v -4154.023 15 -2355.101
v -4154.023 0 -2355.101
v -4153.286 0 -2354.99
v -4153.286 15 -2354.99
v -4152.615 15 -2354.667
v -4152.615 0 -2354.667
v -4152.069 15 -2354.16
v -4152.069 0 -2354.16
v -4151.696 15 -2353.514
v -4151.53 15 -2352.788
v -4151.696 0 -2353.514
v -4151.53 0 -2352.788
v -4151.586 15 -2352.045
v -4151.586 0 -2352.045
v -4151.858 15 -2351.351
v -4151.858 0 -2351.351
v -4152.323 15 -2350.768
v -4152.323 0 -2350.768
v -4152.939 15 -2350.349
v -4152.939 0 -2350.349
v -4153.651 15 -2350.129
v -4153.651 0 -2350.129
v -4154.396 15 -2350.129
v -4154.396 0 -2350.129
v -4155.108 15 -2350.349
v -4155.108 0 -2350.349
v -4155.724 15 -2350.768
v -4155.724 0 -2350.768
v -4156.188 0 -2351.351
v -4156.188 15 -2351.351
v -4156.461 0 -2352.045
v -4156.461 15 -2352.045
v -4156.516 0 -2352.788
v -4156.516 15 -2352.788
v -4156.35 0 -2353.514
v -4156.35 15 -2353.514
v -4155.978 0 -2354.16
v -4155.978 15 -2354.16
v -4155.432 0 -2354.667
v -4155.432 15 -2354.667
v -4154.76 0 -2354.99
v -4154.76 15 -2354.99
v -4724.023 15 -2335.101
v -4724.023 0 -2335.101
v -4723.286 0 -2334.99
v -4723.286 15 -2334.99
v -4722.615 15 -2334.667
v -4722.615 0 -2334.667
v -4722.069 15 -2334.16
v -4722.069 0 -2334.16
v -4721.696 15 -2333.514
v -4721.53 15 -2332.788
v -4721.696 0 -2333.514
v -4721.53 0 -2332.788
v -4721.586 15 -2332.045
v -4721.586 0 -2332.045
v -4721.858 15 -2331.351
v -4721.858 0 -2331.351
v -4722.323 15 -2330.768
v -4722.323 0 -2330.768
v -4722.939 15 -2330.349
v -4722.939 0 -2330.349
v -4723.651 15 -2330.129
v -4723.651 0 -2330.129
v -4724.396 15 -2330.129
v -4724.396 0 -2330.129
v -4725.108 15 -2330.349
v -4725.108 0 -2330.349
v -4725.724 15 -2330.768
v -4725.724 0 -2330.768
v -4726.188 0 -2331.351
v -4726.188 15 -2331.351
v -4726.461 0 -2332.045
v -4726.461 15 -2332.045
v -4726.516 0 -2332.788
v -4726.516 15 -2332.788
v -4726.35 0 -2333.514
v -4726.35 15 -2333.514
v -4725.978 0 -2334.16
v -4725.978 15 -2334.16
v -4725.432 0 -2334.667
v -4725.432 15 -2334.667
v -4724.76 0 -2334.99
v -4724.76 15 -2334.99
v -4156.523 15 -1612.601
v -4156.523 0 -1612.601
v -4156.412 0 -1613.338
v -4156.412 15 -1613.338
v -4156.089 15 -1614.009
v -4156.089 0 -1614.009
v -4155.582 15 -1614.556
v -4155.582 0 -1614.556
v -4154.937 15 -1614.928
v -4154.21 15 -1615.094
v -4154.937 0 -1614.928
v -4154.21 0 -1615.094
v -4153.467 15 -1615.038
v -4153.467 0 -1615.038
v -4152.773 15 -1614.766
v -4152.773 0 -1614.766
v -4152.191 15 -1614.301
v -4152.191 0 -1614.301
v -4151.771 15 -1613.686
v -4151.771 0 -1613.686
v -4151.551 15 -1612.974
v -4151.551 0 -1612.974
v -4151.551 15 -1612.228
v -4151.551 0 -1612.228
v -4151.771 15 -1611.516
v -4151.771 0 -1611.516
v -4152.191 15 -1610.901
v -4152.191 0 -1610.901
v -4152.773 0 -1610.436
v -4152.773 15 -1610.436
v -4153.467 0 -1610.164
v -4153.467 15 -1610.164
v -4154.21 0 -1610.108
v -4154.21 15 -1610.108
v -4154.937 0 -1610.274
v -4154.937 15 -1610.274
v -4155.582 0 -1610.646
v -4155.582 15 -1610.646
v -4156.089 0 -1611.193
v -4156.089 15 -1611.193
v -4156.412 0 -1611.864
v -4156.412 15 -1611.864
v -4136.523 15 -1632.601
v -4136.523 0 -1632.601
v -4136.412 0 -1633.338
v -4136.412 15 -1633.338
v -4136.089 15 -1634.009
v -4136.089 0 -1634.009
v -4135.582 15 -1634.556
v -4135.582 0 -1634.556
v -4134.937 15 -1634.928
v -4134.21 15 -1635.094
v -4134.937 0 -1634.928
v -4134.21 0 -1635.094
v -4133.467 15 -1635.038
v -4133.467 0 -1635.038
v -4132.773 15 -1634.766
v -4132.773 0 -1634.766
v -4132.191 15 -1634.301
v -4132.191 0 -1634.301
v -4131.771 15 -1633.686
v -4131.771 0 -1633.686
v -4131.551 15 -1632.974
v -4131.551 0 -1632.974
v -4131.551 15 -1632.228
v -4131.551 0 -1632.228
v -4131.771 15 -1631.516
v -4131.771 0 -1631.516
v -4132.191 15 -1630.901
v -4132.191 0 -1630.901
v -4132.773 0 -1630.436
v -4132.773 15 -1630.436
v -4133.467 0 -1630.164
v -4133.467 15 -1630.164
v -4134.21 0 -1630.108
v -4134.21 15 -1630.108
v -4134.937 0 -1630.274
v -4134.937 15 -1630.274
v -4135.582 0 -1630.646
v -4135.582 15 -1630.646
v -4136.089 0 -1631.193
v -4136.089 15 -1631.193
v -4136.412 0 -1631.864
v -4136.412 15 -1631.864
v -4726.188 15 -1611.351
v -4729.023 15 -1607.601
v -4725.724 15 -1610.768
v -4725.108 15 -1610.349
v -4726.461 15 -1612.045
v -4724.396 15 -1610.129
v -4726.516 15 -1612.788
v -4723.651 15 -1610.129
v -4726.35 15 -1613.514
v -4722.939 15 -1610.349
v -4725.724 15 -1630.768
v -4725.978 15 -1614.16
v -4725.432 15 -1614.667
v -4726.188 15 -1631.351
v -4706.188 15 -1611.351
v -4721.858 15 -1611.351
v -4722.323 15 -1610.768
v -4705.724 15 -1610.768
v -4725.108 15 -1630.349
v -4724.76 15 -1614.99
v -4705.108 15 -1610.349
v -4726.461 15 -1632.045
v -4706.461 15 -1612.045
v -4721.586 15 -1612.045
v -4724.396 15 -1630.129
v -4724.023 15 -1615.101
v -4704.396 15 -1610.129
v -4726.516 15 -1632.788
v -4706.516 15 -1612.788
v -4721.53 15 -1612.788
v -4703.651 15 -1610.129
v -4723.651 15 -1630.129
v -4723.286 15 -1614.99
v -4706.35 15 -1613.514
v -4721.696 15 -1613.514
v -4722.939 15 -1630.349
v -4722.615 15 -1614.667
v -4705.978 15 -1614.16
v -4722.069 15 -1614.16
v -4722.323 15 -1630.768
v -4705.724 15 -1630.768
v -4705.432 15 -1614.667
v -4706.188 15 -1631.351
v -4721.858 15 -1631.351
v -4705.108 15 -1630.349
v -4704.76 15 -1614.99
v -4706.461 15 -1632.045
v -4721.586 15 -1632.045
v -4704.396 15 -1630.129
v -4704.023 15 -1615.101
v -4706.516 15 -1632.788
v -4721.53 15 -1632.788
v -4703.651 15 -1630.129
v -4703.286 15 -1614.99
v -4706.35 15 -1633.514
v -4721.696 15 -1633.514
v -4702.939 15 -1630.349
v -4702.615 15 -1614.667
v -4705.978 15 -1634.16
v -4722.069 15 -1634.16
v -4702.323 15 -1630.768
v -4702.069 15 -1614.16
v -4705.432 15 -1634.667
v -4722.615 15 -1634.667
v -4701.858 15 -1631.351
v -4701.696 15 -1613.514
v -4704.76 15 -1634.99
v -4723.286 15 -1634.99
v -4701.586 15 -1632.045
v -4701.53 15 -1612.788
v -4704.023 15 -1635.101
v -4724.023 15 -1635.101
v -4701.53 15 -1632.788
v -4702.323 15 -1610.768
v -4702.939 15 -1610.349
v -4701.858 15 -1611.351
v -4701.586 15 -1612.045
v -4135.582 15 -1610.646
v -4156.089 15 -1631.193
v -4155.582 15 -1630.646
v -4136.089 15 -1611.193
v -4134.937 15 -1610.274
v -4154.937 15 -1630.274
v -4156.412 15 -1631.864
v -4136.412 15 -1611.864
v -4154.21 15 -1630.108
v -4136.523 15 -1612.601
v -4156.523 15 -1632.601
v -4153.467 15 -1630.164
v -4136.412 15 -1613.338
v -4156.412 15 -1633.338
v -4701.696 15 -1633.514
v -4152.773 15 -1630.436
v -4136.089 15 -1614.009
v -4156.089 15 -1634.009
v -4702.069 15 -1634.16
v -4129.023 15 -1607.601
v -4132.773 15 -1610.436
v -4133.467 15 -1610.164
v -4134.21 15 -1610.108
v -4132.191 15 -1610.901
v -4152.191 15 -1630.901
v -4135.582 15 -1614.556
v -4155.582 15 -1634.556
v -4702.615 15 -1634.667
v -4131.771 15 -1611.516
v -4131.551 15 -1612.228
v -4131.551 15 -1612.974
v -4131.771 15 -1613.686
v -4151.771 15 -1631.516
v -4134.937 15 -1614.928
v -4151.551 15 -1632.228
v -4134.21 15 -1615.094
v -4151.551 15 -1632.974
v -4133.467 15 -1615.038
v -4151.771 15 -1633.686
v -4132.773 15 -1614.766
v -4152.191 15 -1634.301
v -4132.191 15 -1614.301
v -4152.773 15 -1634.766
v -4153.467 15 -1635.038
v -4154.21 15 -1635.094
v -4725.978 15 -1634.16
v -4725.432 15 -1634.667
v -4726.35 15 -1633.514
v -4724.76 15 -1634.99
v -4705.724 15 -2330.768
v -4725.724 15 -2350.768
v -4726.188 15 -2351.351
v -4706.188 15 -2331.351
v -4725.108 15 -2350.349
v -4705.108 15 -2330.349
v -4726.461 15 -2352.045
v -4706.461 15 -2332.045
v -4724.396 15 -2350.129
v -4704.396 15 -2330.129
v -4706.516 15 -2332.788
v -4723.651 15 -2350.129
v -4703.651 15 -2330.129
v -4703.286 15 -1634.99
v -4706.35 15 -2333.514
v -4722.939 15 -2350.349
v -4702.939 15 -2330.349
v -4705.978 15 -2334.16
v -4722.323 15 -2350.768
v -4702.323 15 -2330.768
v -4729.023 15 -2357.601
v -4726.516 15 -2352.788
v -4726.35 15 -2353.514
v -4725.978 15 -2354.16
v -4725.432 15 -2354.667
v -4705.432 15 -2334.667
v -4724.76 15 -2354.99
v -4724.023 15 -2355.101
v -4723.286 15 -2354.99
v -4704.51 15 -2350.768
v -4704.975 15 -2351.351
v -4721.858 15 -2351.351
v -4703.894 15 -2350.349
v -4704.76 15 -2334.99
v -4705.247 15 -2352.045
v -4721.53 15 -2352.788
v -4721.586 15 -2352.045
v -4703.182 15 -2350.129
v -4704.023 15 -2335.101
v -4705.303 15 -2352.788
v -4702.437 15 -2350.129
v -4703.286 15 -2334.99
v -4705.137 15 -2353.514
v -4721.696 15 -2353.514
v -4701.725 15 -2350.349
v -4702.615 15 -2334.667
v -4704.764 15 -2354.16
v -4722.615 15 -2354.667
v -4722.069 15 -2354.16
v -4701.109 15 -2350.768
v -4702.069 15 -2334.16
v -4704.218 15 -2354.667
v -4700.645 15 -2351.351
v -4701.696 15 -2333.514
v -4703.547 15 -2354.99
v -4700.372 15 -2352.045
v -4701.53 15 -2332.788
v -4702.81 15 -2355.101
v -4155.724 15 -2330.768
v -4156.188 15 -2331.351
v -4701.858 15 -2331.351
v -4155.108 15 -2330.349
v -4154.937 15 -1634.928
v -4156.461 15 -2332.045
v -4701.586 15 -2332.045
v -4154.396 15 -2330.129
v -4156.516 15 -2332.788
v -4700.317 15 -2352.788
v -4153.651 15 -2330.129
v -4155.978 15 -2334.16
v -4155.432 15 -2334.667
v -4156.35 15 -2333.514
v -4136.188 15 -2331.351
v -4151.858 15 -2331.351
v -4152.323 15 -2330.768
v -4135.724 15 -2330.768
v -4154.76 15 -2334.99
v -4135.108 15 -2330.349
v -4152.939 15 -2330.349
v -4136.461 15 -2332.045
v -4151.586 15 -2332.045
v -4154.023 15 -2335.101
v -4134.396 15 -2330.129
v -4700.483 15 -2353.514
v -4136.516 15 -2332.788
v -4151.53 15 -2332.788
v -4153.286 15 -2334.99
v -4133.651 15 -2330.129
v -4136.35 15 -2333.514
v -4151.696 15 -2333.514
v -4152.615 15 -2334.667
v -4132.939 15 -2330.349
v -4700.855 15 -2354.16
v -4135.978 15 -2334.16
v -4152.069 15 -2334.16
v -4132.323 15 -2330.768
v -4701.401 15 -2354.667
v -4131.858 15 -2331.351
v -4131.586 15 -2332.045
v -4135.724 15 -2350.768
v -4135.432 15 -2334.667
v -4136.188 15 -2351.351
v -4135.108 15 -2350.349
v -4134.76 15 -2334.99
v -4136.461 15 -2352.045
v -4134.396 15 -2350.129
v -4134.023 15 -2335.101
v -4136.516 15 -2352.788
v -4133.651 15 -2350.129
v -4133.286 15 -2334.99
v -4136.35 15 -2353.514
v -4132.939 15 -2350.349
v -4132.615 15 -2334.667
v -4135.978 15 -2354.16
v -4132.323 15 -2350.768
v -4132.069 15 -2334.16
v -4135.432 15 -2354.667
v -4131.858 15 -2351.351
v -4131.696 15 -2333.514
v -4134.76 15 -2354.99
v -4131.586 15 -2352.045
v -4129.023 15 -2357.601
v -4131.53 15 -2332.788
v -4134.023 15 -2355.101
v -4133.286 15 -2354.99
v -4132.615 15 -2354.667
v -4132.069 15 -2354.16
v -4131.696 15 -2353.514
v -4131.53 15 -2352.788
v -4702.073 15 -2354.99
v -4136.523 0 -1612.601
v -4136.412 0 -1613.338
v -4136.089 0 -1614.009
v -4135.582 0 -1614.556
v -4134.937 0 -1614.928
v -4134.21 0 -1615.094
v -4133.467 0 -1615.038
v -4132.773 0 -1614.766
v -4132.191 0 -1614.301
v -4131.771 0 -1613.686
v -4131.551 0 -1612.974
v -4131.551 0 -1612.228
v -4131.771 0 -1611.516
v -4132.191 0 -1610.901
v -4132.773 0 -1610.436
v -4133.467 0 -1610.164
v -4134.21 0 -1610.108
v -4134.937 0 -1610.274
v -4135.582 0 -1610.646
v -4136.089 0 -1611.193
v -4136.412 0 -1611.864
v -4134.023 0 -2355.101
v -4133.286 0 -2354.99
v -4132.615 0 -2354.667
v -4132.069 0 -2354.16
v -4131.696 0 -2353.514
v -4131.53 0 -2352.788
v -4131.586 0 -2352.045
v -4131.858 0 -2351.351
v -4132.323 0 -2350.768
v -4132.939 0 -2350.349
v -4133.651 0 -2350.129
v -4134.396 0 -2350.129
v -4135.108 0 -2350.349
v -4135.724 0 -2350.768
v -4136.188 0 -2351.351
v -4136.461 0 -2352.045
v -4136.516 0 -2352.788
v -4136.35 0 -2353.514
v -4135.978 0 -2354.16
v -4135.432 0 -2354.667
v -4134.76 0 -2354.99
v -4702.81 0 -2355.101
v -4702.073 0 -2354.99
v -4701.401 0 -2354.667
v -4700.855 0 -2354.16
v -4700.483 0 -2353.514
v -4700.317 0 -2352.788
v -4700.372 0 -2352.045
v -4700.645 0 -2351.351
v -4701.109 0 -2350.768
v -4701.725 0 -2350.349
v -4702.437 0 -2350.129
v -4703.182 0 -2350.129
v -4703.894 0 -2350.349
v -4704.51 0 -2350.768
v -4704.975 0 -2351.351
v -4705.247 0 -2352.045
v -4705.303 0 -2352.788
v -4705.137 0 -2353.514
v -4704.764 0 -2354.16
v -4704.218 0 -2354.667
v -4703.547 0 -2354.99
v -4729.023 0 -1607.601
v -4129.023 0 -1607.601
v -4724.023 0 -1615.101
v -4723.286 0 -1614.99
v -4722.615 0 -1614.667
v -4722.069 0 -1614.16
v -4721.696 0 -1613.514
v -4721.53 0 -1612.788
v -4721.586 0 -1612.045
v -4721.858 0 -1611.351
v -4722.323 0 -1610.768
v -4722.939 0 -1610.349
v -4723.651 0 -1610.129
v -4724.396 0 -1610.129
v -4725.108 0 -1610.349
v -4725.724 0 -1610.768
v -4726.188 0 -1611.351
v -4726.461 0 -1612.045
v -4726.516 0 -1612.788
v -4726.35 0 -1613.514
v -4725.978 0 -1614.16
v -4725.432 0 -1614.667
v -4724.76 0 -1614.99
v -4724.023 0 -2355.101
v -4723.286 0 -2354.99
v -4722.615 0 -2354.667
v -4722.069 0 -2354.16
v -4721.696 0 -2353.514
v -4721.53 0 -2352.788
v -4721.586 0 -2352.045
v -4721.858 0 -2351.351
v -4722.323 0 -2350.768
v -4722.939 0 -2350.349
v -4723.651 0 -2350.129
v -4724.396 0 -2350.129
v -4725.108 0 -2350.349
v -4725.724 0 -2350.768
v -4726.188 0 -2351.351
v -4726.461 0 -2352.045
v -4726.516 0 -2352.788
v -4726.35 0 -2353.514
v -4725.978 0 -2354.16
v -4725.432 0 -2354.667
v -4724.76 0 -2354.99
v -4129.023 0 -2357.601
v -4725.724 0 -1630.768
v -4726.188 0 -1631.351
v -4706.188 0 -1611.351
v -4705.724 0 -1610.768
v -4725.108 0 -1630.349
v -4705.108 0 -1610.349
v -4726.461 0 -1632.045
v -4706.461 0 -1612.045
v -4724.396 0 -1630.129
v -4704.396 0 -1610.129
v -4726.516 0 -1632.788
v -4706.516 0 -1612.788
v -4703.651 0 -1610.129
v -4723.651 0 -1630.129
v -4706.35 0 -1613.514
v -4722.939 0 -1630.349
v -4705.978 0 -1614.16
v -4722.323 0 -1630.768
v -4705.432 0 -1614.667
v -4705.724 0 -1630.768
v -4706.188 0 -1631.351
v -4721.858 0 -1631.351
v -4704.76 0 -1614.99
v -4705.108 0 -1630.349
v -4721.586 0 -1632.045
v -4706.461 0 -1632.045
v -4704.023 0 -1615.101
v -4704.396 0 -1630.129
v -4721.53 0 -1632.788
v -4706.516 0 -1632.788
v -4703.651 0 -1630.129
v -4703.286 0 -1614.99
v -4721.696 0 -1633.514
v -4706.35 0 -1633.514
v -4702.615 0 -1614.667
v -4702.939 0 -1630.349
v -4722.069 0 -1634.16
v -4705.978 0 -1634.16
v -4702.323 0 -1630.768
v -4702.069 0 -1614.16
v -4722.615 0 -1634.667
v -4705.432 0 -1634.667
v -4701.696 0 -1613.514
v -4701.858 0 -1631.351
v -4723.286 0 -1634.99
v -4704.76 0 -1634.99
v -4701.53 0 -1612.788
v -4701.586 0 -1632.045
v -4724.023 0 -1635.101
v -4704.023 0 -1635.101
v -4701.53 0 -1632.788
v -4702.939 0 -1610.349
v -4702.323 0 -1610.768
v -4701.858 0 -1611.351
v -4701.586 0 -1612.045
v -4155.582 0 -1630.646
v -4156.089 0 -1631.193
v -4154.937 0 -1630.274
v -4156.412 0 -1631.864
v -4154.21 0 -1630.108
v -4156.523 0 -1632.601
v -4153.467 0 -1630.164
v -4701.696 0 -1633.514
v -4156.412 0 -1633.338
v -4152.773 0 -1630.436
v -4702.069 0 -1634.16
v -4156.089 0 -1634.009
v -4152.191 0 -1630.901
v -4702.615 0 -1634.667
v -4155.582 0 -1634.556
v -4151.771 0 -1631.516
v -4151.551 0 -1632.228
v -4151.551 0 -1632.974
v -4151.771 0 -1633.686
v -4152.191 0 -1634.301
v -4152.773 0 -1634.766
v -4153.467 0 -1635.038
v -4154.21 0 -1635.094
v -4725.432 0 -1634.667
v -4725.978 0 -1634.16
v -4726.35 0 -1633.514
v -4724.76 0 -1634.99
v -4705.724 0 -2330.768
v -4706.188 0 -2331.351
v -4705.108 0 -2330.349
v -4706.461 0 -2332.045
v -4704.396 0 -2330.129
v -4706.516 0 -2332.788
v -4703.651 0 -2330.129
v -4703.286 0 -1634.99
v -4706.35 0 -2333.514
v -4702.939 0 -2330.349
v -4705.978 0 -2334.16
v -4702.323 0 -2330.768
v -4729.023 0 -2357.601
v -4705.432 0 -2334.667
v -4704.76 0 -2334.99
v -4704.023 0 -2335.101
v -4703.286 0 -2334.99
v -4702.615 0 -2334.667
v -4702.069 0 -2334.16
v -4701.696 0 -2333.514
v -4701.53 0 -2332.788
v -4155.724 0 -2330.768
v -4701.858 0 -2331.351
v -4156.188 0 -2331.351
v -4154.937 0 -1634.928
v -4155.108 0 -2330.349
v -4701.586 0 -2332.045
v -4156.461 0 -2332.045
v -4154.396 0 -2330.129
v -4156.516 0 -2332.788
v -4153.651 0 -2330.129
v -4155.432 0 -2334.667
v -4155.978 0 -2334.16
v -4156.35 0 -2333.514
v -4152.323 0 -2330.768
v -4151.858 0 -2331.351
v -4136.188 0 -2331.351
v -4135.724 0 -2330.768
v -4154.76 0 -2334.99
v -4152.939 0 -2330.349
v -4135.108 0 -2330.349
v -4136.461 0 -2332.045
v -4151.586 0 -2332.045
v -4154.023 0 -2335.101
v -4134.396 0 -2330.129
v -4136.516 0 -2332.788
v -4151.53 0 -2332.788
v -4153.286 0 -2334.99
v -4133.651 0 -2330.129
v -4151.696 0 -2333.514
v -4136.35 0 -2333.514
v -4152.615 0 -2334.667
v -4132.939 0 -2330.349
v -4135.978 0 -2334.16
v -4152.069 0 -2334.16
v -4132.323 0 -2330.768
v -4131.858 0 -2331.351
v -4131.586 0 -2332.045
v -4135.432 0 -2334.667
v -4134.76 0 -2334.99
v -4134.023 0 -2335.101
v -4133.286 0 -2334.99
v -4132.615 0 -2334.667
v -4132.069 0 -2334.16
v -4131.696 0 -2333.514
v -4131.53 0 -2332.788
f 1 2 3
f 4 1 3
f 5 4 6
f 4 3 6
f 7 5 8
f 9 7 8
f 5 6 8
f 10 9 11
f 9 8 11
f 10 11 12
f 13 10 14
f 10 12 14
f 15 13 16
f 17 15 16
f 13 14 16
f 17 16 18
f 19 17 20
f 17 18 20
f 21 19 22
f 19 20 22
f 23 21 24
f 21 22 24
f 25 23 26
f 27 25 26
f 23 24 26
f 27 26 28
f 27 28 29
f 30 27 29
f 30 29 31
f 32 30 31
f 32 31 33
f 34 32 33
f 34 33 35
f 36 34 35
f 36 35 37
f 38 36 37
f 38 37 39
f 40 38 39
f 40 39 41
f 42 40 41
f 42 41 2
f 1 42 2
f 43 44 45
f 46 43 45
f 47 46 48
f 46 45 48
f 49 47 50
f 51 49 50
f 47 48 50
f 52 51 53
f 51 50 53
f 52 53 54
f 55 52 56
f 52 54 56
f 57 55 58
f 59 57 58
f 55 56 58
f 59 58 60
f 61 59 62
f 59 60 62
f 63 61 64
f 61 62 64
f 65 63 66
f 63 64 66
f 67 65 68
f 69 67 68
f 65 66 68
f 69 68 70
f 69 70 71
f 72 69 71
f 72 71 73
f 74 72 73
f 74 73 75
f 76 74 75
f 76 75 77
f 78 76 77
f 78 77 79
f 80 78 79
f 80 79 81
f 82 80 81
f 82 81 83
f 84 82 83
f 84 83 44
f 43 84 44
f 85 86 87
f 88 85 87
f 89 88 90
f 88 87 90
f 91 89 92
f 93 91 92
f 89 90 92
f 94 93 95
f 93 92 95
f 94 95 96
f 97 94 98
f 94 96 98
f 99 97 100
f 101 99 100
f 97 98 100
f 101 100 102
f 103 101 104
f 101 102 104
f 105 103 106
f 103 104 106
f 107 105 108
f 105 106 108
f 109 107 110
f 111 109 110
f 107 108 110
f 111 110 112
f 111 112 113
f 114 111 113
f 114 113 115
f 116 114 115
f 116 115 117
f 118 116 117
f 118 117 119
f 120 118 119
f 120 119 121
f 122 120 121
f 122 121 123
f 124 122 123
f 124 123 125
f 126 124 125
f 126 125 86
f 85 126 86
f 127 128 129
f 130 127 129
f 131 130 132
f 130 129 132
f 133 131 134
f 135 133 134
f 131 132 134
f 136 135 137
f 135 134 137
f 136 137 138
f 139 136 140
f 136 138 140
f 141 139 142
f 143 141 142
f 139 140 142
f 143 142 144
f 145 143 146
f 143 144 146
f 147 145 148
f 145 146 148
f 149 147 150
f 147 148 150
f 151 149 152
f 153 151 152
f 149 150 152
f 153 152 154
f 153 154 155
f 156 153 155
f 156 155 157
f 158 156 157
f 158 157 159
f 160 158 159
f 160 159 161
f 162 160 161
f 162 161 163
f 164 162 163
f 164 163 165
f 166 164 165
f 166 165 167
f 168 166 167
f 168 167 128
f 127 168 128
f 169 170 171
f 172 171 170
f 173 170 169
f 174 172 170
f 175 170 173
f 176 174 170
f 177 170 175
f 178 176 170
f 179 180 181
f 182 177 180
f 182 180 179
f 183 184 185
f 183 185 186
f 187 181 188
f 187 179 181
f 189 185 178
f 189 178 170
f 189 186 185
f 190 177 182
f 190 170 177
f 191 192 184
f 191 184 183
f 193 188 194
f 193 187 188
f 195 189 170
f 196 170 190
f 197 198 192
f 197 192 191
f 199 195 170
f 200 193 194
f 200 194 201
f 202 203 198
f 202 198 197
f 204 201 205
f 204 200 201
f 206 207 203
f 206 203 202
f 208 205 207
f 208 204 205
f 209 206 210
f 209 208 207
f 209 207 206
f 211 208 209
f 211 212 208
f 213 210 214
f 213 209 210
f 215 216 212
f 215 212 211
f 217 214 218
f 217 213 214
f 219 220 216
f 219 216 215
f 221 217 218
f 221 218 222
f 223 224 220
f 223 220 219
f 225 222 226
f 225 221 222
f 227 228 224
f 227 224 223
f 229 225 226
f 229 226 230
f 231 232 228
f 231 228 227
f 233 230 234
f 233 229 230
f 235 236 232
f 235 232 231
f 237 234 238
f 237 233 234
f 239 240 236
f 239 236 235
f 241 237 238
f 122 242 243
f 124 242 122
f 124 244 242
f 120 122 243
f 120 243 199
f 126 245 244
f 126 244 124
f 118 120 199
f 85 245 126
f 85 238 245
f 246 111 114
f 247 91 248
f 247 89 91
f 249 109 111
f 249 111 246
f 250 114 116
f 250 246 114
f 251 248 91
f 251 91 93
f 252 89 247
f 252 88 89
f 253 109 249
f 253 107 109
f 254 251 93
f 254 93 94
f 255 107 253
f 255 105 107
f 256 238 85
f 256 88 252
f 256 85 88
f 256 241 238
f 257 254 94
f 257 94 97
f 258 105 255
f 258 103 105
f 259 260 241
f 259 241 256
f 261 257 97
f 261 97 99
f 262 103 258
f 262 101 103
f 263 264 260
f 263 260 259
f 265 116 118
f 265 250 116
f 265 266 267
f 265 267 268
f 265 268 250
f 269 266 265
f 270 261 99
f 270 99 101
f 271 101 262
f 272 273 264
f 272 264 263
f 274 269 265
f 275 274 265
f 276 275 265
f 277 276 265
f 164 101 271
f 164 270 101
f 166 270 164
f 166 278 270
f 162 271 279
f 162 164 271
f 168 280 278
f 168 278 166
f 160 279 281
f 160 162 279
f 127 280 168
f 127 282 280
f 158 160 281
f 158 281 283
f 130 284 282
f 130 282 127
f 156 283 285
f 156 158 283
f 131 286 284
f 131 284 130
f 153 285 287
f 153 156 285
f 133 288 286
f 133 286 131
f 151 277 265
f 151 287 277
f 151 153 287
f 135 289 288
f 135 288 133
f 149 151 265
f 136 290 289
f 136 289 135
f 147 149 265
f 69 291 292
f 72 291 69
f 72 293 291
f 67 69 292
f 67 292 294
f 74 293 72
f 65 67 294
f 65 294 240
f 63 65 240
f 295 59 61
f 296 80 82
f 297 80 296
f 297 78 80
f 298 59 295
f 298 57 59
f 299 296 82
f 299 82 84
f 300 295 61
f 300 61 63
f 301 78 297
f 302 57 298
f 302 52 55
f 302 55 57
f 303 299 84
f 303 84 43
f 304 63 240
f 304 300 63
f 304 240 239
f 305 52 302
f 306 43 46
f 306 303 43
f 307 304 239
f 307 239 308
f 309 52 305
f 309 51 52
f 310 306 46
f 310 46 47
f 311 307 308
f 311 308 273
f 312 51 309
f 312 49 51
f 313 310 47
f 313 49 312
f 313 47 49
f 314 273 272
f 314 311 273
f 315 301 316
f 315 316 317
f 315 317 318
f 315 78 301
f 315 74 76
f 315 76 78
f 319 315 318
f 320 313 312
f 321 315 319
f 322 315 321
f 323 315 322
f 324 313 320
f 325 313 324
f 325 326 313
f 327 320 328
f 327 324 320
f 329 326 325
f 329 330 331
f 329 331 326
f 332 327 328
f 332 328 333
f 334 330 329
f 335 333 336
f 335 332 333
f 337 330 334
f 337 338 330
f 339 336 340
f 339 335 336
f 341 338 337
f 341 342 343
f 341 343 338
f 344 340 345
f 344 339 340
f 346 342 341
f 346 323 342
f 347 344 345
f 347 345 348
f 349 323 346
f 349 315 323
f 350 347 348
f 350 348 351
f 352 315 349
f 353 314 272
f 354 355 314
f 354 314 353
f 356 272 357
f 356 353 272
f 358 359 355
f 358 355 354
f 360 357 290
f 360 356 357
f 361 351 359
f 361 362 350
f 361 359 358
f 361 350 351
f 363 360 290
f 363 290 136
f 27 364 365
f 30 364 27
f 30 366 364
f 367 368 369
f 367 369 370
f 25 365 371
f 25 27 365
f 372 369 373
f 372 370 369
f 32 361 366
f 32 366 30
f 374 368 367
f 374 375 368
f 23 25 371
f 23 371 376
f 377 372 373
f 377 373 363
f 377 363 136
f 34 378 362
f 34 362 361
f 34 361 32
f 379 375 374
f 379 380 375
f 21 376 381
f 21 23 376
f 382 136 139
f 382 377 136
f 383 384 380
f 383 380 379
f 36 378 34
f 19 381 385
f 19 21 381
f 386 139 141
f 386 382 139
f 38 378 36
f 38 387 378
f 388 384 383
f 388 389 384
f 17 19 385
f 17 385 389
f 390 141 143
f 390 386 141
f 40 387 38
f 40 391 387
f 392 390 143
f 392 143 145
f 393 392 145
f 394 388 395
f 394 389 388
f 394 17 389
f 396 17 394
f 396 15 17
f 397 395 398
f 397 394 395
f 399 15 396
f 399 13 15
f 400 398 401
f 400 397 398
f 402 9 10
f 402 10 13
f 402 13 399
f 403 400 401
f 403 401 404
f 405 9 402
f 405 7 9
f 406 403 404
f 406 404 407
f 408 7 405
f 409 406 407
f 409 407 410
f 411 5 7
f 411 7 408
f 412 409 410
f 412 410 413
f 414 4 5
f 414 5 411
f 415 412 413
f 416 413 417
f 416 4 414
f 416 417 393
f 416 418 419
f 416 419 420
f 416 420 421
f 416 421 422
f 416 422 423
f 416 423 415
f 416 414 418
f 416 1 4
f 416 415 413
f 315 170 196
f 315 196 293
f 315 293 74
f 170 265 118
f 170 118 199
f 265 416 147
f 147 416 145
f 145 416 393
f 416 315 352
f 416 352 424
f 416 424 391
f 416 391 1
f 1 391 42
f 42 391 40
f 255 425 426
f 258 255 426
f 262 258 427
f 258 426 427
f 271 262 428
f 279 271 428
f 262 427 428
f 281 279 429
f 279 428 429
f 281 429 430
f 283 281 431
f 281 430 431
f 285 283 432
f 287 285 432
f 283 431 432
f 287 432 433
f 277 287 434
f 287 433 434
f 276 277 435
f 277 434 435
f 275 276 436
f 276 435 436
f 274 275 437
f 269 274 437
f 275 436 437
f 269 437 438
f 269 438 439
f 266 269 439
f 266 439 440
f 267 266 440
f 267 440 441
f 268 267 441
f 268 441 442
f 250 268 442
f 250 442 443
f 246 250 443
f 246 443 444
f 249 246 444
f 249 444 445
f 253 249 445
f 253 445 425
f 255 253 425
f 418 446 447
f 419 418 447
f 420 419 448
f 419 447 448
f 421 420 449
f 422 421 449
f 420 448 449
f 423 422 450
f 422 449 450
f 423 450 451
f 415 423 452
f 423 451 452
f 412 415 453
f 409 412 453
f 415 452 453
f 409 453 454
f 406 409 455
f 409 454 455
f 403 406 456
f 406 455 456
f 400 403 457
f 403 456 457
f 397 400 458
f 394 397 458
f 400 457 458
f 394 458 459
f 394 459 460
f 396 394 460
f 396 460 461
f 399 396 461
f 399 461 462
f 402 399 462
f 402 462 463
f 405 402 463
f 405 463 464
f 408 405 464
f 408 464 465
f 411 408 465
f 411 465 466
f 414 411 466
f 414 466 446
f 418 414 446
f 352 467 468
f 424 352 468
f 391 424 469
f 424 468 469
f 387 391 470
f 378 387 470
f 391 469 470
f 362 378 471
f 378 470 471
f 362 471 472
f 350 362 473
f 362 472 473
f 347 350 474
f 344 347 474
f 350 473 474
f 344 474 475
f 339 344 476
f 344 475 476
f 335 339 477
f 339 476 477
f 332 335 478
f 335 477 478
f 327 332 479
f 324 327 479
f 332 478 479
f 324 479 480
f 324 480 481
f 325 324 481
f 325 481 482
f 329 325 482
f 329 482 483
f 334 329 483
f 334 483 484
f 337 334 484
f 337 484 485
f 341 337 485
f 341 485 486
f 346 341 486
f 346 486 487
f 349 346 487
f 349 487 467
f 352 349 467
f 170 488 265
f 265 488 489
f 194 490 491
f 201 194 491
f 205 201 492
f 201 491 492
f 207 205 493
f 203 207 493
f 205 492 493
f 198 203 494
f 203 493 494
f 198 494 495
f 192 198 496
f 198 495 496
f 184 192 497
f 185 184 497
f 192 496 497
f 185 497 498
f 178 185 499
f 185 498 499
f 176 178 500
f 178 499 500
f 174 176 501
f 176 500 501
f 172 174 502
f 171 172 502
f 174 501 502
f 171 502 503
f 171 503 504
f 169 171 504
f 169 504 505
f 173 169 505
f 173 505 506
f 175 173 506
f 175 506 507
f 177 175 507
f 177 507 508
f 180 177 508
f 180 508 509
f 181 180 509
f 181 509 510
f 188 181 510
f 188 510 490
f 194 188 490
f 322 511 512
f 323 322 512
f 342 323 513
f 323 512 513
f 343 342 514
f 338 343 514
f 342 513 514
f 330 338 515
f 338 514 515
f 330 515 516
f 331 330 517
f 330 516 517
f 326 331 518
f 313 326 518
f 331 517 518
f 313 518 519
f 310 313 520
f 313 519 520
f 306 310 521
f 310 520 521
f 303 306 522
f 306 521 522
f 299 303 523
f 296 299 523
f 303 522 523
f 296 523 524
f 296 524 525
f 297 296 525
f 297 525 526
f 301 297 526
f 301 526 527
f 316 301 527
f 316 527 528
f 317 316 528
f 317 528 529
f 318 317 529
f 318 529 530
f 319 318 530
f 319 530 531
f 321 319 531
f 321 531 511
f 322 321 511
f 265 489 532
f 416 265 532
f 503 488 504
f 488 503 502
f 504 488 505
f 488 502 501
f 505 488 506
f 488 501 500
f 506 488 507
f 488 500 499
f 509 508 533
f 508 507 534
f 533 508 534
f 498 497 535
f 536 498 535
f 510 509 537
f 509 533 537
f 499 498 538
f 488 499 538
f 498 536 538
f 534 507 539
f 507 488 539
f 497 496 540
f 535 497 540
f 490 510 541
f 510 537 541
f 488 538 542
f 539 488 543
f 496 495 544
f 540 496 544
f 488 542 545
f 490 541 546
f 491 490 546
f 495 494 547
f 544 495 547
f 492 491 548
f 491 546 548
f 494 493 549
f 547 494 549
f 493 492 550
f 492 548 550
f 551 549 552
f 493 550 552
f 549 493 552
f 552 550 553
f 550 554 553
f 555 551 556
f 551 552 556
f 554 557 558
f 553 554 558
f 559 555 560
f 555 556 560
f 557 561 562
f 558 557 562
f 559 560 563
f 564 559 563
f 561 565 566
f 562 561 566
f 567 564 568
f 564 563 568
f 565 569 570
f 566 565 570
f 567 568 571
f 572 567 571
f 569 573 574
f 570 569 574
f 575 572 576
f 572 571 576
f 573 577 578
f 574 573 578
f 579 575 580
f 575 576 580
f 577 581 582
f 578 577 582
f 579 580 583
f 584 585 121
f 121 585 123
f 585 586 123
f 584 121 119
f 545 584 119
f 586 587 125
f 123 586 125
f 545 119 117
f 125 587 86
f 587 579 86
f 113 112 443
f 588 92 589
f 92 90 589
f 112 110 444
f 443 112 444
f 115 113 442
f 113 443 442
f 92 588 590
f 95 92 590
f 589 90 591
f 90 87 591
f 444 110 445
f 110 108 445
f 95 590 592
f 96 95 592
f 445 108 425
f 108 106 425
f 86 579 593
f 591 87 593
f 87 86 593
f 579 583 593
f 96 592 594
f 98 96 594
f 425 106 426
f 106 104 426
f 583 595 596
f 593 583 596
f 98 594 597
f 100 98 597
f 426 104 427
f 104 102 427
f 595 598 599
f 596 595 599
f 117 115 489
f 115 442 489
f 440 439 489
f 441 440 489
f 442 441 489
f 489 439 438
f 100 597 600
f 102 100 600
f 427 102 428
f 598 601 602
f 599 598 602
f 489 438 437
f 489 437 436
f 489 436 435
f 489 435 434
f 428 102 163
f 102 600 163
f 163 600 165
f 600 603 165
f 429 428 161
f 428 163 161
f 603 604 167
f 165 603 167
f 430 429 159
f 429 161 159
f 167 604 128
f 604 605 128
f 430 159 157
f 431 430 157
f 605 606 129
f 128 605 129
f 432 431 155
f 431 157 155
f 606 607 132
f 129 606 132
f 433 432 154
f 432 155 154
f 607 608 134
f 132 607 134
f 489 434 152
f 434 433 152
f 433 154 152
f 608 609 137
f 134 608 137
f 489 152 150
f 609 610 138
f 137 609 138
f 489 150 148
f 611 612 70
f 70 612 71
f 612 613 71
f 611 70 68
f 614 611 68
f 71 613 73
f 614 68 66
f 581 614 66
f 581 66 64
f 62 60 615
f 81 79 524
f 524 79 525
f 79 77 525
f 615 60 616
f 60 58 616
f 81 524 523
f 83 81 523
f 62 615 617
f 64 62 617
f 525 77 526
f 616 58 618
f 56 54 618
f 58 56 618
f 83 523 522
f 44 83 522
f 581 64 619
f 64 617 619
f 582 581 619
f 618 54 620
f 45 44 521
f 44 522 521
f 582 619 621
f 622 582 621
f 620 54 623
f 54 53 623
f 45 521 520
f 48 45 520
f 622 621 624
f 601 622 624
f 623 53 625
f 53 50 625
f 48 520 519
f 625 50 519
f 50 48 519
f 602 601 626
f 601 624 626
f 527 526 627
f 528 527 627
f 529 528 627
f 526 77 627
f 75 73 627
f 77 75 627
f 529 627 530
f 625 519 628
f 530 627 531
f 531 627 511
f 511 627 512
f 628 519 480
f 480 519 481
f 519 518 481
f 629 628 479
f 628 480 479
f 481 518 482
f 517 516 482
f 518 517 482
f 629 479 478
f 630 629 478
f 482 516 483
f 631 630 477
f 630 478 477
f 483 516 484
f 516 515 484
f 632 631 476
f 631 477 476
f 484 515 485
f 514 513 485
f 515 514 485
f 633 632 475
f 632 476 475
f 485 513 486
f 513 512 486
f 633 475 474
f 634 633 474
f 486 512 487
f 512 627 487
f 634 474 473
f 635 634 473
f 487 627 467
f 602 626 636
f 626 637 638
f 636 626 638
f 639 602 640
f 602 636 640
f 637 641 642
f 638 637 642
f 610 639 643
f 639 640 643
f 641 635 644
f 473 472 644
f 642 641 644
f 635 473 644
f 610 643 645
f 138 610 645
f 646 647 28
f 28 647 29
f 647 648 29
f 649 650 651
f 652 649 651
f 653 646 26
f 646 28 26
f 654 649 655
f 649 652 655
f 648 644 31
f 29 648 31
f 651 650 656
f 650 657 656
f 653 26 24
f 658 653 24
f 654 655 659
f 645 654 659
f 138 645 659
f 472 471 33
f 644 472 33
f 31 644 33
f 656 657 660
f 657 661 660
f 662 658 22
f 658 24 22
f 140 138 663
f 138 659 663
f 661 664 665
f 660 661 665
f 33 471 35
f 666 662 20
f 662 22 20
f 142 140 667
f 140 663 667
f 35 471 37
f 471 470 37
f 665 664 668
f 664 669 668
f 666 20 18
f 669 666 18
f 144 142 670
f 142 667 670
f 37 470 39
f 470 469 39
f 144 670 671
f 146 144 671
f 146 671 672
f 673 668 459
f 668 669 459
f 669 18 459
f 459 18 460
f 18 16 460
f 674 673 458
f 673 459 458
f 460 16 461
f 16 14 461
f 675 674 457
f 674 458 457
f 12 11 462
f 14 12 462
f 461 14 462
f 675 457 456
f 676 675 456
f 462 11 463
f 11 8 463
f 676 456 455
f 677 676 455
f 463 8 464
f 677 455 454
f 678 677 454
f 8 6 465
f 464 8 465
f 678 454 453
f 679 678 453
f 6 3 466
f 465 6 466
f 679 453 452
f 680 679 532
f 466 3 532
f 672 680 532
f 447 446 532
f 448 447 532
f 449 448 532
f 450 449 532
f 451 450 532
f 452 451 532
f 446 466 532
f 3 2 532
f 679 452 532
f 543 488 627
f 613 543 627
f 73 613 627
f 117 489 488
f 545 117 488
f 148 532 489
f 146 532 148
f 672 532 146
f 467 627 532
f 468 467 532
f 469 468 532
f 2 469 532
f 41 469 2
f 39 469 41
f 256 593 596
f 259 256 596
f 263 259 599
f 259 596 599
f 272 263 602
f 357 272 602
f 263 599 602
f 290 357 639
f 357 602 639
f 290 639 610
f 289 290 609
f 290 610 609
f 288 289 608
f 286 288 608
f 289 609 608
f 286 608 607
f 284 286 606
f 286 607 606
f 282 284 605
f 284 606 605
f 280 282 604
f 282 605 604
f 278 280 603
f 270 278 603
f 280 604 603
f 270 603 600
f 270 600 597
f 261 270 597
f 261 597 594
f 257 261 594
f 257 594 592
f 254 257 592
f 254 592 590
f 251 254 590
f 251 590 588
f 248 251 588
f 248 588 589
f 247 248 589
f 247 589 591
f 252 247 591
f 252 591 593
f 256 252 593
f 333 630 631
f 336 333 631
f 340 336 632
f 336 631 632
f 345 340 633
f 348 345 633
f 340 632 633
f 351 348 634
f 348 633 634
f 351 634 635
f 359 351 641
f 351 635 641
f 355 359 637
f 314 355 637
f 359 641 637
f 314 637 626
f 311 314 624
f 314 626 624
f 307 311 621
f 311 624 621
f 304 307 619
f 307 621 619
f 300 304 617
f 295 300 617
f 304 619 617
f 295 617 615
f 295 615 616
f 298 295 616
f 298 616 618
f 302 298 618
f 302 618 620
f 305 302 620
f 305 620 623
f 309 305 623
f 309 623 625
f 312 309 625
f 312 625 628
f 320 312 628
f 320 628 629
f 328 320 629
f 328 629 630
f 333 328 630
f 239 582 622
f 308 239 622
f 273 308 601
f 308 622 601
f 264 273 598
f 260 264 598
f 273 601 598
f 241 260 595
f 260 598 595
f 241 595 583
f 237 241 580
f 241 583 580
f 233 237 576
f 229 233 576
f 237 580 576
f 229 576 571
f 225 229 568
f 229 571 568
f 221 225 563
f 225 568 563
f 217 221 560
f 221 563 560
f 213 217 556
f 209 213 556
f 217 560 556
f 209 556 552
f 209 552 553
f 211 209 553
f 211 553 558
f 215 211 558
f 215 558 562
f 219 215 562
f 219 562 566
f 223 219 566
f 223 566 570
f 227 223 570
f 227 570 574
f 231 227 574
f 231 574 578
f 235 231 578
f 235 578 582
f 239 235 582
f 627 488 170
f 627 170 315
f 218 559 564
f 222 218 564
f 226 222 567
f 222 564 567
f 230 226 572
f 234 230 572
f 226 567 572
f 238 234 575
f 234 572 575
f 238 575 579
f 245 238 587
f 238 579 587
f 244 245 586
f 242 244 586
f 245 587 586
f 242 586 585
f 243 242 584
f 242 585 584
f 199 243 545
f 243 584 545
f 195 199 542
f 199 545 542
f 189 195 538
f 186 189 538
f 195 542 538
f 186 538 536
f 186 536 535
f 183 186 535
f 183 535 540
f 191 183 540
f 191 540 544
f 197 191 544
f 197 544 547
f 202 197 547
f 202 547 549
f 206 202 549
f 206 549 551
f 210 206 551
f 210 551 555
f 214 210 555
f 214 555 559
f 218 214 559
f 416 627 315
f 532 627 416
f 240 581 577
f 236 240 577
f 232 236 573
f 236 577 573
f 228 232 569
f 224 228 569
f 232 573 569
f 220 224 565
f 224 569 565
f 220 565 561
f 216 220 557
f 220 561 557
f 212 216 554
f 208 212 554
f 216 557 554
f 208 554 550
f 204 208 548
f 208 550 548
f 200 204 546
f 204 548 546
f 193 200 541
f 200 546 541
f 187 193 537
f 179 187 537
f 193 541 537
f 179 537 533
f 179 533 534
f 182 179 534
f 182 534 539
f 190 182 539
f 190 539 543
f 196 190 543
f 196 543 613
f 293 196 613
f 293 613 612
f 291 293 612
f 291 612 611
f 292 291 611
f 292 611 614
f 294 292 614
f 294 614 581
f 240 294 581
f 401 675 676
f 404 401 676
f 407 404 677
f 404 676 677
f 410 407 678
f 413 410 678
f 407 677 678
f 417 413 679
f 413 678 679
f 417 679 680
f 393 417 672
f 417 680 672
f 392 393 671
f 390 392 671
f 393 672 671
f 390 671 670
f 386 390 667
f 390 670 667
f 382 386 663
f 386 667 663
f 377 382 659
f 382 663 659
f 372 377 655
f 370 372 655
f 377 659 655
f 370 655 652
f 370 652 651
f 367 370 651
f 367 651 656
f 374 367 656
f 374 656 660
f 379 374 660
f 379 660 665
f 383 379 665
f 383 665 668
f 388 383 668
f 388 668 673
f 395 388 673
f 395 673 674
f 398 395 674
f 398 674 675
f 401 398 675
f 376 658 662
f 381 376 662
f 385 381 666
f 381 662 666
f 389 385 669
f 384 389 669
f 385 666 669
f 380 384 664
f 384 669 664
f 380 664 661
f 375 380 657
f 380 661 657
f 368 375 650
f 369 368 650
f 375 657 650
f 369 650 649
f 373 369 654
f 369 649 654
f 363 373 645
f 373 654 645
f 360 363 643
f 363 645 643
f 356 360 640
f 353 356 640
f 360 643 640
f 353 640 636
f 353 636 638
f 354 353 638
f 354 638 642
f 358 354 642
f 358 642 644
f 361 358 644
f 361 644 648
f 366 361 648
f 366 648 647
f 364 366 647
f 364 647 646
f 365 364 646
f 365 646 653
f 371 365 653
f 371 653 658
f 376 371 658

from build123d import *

# Parameters (mm, degrees)
SKETCH1_W                 = 600
SKETCH1_H                 = 750
BOSS_EXTRUDE1_DEPTH       = 15
F_5_0MM_DOWEL_HOLE1_D     = 5
F_5_0MM_DOWEL_HOLE1_DEPTH = 30
F_5_0MM_DOWEL_HOLE1_TIP   = 1.502151548
F_5_0MM_DOWEL_HOLE2_D     = 5


with BuildPart() as part:
    # Sketch1 → Boss-Extrude1 (new body)
    with BuildSketch(Plane(origin=(0, 0, 0), x_dir=(1, 0, 0), z_dir=(0, 1, 0))):
        with Locations((-4429.023254343, 1982.601020053)):
            Rectangle(SKETCH1_W, SKETCH1_H)
    extrude(amount=BOSS_EXTRUDE1_DEPTH)

    # Ø5.0mm Dowel Hole1
    with Locations(Plane(origin=(0, 15, 0), x_dir=(1, 0, 0), z_dir=(0, 1, 0))):
        with Locations((-4134.023254343, 1632.601020053), (-4154.023254343, 1632.601020053), (-4154.023254343, 1612.601020053), (-4134.023254343, 1612.601020053)):
            Hole(F_5_0MM_DOWEL_HOLE1_D / 2, depth=F_5_0MM_DOWEL_HOLE1_DEPTH)
            with Locations((0, 0, -(F_5_0MM_DOWEL_HOLE1_DEPTH + F_5_0MM_DOWEL_HOLE1_TIP / 2))):  # 118° drill point
                Cone(0, F_5_0MM_DOWEL_HOLE1_D / 2, F_5_0MM_DOWEL_HOLE1_TIP, mode=Mode.SUBTRACT)

    # Ø5.0mm Dowel Hole2 (through all)
    with Locations(Plane(origin=(-4724.023254343, 15, -2352.601020053), x_dir=(0, 0, 1), z_dir=(0, 1, 0))):
        with Locations((0, 0), (0, 21.213554644), (20, 0), (20, 20), (0, 590), (0, 570), (20, 570), (20, 590), (720, 20), (740, 20), (740, 0), (720, 0)):
            Hole(F_5_0MM_DOWEL_HOLE2_D / 2)


solid = part.part
